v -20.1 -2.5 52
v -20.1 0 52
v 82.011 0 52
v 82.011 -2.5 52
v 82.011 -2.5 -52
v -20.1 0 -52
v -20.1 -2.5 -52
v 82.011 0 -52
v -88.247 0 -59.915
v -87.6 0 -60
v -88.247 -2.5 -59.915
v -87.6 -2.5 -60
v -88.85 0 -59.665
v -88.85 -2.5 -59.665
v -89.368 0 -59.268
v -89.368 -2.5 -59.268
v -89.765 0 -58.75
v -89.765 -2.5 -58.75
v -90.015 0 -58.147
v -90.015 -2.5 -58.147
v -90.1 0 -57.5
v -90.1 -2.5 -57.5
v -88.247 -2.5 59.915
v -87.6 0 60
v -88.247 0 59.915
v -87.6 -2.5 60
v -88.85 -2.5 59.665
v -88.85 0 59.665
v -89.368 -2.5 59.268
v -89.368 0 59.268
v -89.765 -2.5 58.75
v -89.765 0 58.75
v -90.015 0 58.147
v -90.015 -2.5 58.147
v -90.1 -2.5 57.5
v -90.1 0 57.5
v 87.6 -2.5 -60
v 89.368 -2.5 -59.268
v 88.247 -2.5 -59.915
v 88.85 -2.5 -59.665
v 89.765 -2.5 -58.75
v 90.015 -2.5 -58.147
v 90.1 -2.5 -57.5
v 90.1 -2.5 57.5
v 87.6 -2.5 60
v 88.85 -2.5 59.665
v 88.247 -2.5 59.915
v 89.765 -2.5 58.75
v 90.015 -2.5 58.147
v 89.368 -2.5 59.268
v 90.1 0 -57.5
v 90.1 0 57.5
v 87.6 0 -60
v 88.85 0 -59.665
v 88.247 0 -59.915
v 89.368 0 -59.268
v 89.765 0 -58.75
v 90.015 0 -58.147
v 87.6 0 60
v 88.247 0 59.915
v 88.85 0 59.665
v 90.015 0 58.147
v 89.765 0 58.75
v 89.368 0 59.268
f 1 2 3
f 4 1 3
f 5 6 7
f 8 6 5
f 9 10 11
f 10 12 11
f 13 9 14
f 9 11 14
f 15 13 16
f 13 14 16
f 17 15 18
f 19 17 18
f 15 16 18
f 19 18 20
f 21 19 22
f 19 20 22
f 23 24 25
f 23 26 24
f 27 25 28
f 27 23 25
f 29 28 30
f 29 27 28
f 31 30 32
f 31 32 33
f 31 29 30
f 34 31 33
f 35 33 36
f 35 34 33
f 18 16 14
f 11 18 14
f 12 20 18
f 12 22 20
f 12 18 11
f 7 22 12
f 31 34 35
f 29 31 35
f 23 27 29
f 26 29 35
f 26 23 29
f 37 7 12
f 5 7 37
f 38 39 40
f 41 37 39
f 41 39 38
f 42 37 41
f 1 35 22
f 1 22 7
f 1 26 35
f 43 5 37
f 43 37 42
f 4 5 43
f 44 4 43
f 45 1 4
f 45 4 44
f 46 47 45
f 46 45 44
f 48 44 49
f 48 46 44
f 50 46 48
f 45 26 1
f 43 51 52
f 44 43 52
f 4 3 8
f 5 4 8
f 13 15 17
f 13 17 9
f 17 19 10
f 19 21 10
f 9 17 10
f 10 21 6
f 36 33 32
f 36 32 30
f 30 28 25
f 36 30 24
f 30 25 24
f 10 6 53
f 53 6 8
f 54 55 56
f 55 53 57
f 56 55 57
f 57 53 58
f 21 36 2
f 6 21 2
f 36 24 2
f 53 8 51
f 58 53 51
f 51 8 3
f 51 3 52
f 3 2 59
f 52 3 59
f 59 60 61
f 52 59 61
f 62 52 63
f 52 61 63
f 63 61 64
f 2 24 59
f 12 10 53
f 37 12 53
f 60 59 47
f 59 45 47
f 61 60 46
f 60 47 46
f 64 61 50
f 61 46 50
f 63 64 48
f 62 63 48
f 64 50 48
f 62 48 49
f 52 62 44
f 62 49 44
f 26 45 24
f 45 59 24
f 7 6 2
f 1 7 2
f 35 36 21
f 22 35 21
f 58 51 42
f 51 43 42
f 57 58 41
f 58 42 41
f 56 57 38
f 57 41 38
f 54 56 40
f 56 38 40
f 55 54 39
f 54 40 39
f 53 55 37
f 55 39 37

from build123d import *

# Parameters (mm, degrees)
F1_DEPTH = 2.5
F2_DEPTH = 2.5
F3_DEPTH = 2.5
F0_W     = 102.1108726621
F0_H     = 8
F4_DEPTH = 2.5
F5_DEPTH = 2.5
F6_R     = 2.5
F7_R     = 2.5
F8_R     = 2.5
F9_R     = 2.5


with BuildPart() as f1:
    # F0 (on Front) → F1 (new body)
    with BuildSketch(Plane.XZ):
        Polygon((-20.1, 60), (-90.1, 60), (-90.1, -60), (-20.1, -60), (-20.1, -52), (-20.1, 52), align=None)
    extrude(amount=F1_DEPTH)

    # F0 (on Front) → F2 (join)
    with BuildSketch(Plane.XZ):
        Polygon((90.1, 60), (-20.1, 60), (-20.1, 52), (82.0108726621, 52), (90.1, 52), align=None)
    extrude(amount=F2_DEPTH)

    # F0 (on Front) → F3 (join)
    with BuildSketch(Plane.XZ):
        Polygon((90.1, -60), (90.1, 52), (82.0108726621, 52), (82.0108726621, -52), (82.0108726621, -60), align=None)
    extrude(amount=F3_DEPTH)

    # F0 (on Front) → F4 (join)
    with BuildSketch(Plane.XZ):
        with Locations((30.955436331, -56)):
            Rectangle(F0_W, F0_H)
    extrude(amount=F4_DEPTH)

    # F0 (on Front) → F5 (join)
    with BuildSketch(Plane.XZ):
        Polygon((90.1, -60), (90.1, 52), (82.0108726621, 52), (82.0108726621, -52), (82.0108726621, -60), align=None)
    extrude(amount=F5_DEPTH)

    # F6
    f6_edges = [f1.edges().sort_by_distance(p)[0] for p in [
        (-90.1, -1.25, 60),
    ]]
    fillet(f6_edges, radius=F6_R)

    # F7
    f7_edges = [f1.edges().sort_by_distance(p)[0] for p in [
        (90.1, -1.25, 60),
    ]]
    fillet(f7_edges, radius=F7_R)

    # F8
    f8_edges = [f1.edges().sort_by_distance(p)[0] for p in [
        (90.1, -1.25, -60),
    ]]
    fillet(f8_edges, radius=F8_R)

    # F9
    f9_edges = [f1.edges().sort_by_distance(p)[0] for p in [
        (-90.1, -1.25, -60),
    ]]
    fillet(f9_edges, radius=F9_R)


solid = f1.part
